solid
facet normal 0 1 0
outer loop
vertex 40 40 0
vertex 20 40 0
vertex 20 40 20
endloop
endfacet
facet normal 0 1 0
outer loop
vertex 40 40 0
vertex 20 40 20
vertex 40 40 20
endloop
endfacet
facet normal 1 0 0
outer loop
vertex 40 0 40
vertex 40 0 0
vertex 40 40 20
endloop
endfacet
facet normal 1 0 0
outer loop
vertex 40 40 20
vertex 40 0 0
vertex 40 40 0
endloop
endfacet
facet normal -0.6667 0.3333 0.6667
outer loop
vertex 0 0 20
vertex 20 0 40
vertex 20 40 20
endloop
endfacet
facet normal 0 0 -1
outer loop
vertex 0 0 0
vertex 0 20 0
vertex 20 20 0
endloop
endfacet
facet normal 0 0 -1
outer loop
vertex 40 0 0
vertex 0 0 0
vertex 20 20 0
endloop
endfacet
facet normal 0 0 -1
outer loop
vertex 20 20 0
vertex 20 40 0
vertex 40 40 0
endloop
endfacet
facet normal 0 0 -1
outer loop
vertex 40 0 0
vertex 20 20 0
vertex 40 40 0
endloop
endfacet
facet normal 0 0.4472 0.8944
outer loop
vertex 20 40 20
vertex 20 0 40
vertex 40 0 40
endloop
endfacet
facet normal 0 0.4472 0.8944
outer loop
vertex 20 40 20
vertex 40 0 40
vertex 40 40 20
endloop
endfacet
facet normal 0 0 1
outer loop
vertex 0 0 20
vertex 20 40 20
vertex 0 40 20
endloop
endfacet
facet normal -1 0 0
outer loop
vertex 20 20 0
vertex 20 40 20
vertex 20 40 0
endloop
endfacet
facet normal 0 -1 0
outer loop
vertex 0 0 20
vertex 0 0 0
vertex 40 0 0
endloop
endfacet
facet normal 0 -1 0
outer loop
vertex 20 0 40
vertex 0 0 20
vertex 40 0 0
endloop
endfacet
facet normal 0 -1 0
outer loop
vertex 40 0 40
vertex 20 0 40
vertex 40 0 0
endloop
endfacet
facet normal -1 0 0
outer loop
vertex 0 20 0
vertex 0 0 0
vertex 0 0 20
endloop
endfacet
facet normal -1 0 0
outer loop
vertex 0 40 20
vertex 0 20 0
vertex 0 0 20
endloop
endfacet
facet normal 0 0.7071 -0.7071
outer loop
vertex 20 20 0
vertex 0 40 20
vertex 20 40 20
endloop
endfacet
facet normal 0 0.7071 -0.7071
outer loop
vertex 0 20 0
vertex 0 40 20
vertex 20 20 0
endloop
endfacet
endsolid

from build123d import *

# Parameters (mm, degrees)
SKETCH1_W           = 40
SKETCH1_H           = 40
BOSS_EXTRUDE1_DEPTH = 40
CUT_EXTRUDE1_DEPTH  = 40
CUT_EXTRUDE2_DEPTH  = 40
CUT_EXTRUDE3_DEPTH  = 20
CUT_EXTRUDE4_DEPTH  = 20
CUT_EXTRUDE7_DEPTH  = 49


with BuildPart() as part:
    # Sketch1 → Boss-Extrude1 (new body)
    with BuildSketch(Plane.XY):
        with Locations((20, 20)):
            Rectangle(SKETCH1_W, SKETCH1_H)
    extrude(amount=BOSS_EXTRUDE1_DEPTH)

    # Sketch2 → Cut-Extrude1 (cut)
    with BuildSketch(Plane.ZY):
        Polygon((40, 0), (20, 40), (40, 40), align=None)
    extrude(amount=-CUT_EXTRUDE1_DEPTH, mode=Mode.SUBTRACT)

    # Sketch3 → Cut-Extrude2 (cut)
    with BuildSketch(Plane.XZ):
        Polygon((0, 20), (20, 40), (0, 40), align=None)
    extrude(amount=-CUT_EXTRUDE2_DEPTH, mode=Mode.SUBTRACT)

    # Sketch4 → Cut-Extrude3 (cut)
    with BuildSketch(Plane.ZY):
        Polygon((20, 40), (0, 20), (0, 40), align=None)
    extrude(amount=-CUT_EXTRUDE3_DEPTH, mode=Mode.SUBTRACT)

    # Sketch5 → Cut-Extrude4 (cut)
    with BuildSketch(Plane(origin=(-8.888888889, 4.444444444, 8.888888889), x_dir=(0.745355992, 0.298142397, 0.596284794), z_dir=(-0.666666667, 0.333333333, 0.666666667))):
        Polygon((38.75851161, 26.83281573), (38.75851161, -17.88854382), (11.92569588, -8.94427191), align=None)
    extrude(amount=CUT_EXTRUDE4_DEPTH, mode=Mode.SUBTRACT)

    # Sketch8 → Cut-Extrude7 (cut)
    with BuildSketch(Plane.XY.offset(20)):
        Polygon((20, 40), (0, 0), (0, 40), align=None)
    extrude(amount=CUT_EXTRUDE7_DEPTH, mode=Mode.SUBTRACT)


solid = part.part
